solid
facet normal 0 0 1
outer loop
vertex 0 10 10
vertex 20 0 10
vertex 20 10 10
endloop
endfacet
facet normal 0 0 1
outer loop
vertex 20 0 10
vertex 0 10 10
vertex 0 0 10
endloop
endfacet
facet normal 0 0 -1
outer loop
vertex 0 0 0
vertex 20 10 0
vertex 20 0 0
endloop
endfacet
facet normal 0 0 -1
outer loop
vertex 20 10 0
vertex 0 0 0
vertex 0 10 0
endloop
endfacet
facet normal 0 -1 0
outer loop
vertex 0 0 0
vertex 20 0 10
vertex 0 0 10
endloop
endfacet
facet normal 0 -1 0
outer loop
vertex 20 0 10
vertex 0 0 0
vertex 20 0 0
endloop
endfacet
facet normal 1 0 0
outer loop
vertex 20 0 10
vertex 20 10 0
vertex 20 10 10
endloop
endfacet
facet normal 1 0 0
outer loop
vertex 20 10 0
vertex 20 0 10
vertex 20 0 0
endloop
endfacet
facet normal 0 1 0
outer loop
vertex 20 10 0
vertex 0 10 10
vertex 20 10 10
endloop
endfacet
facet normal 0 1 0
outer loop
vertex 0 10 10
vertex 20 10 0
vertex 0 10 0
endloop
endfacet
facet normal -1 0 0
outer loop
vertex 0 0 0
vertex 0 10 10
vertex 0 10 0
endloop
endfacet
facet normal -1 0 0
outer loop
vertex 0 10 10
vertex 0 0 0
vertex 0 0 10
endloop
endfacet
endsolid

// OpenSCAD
// file: functions.scad
module create_cylinder(length,diameter){
    cylinder(length,diameter/2,diameter/2, center=true);
}
// file: fit_cube.scad
module fit_cube(fit_cube_length,fit_cube_width){
    cube([fit_cube_length,fit_cube_width,fit_cube_width]);
}
// file: half_roller.scad
module half_roller(main_cylinder_diam,small_cylinder_diam,fit_cube_length,fit_cube_width,base_width,washer_width){
    small_cylinder_overlap=2;
    fit_tolerance=0.2;
    washer_tolerance=1;

    difference(){
        union(){
            cylinder(r=main_cylinder_diam/2,h=(base_width-fit_tolerance)/2-washer_width-2*washer_tolerance);
            cylinder(,r=small_cylinder_diam/2,h=base_width/2+small_cylinder_overlap);
        }
        cube([fit_cube_width,fit_cube_width,2*(fit_cube_length+1)],center=true);
    }
}
// file: washer.scad
use <functions.scad>

module create_washer(washer_width,main_cylinder_diam,small_cylinder_diam){
    washer_diameter=main_cylinder_diam;
    washer_radius_tolerance=1;

    difference(){
        create_cylinder(washer_width,washer_diameter);
        create_cylinder(washer_width+1,small_cylinder_diam+2*washer_radius_tolerance);}
}
// file: base.scad
use <functions.scad>

module logo(logo_width){
    length_por_width=2.065;
    length=30;
    width=length/length_por_width;
    rotate([0,0,90]) translate([-length/2,-width/2,0]) resize([length,width]) linear_extrude(height = logo_width+1) import("logo.dxf");
}

module space_for_rollers(x,base_width,axis_height,small_cylinder_diam,radius_tolerance){
    pocket_width=small_cylinder_diam+2*radius_tolerance;

    translate([x,0,axis_height]) {
        rotate([90,0,0]) create_cylinder(base_width+1,pocket_width);
        translate([-pocket_width/2,-(base_width+1)/2,0]) cube([pocket_width,base_width+1,100,]);
    }
}

module create_base(base_width,small_cylinder_diam,main_cylinder_diam){
    wall_thickness=3;
    small_cylinder_radius_tol=1;
    distance_between_rollers=50;
    radius_tolerance=1;
    distance_base_height_cylinder_centrum=small_cylinder_diam;
    distance_tolerance=1;
    base_height=wall_thickness+distance_tolerance+main_cylinder_diam/2+distance_base_height_cylinder_centrum;
    distance_tolerance=2;
    logo_width=1;

    base_length=distance_between_rollers+small_cylinder_diam+2*(radius_tolerance+wall_thickness);

    difference(){
        translate([-base_length/2,-base_width/2,0]) cube([base_length,base_width,base_height]);
        pocket_width=base_width-2*wall_thickness;
        translate([-base_length/2-1,-pocket_width/2,wall_thickness]) cube([base_length+2,pocket_width,base_height]);
        axis_height=base_height-distance_base_height_cylinder_centrum;
        space_for_rollers(-distance_between_rollers/2,base_width,axis_height,small_cylinder_diam,radius_tolerance);
        space_for_rollers(distance_between_rollers/2,base_width,axis_height,small_cylinder_diam,radius_tolerance);
        translate([0,0,wall_thickness-logo_width]) logo(logo_width);
     }

}
// main file
$fn=50;
base_width=100;

washer_width=1;
washer_tolerance=1;

fit_cube_length=20;
fit_cube_width=10;

use <base.scad>
use <washer.scad>
use <half_roller.scad>
use <fit_cube.scad>

small_cylinder_diam=2;
main_cylinder_diam=20;

//create_base(base_width,small_cylinder_diam,main_cylinder_diam);
//create_washer(washer_width,main_cylinder_diam,small_cylinder_diam);
//half_roller(main_cylinder_diam,small_cylinder_diam,fit_cube_length,fit_cube_width,base_width,washer_width);
fit_cube(fit_cube_length,fit_cube_width);
